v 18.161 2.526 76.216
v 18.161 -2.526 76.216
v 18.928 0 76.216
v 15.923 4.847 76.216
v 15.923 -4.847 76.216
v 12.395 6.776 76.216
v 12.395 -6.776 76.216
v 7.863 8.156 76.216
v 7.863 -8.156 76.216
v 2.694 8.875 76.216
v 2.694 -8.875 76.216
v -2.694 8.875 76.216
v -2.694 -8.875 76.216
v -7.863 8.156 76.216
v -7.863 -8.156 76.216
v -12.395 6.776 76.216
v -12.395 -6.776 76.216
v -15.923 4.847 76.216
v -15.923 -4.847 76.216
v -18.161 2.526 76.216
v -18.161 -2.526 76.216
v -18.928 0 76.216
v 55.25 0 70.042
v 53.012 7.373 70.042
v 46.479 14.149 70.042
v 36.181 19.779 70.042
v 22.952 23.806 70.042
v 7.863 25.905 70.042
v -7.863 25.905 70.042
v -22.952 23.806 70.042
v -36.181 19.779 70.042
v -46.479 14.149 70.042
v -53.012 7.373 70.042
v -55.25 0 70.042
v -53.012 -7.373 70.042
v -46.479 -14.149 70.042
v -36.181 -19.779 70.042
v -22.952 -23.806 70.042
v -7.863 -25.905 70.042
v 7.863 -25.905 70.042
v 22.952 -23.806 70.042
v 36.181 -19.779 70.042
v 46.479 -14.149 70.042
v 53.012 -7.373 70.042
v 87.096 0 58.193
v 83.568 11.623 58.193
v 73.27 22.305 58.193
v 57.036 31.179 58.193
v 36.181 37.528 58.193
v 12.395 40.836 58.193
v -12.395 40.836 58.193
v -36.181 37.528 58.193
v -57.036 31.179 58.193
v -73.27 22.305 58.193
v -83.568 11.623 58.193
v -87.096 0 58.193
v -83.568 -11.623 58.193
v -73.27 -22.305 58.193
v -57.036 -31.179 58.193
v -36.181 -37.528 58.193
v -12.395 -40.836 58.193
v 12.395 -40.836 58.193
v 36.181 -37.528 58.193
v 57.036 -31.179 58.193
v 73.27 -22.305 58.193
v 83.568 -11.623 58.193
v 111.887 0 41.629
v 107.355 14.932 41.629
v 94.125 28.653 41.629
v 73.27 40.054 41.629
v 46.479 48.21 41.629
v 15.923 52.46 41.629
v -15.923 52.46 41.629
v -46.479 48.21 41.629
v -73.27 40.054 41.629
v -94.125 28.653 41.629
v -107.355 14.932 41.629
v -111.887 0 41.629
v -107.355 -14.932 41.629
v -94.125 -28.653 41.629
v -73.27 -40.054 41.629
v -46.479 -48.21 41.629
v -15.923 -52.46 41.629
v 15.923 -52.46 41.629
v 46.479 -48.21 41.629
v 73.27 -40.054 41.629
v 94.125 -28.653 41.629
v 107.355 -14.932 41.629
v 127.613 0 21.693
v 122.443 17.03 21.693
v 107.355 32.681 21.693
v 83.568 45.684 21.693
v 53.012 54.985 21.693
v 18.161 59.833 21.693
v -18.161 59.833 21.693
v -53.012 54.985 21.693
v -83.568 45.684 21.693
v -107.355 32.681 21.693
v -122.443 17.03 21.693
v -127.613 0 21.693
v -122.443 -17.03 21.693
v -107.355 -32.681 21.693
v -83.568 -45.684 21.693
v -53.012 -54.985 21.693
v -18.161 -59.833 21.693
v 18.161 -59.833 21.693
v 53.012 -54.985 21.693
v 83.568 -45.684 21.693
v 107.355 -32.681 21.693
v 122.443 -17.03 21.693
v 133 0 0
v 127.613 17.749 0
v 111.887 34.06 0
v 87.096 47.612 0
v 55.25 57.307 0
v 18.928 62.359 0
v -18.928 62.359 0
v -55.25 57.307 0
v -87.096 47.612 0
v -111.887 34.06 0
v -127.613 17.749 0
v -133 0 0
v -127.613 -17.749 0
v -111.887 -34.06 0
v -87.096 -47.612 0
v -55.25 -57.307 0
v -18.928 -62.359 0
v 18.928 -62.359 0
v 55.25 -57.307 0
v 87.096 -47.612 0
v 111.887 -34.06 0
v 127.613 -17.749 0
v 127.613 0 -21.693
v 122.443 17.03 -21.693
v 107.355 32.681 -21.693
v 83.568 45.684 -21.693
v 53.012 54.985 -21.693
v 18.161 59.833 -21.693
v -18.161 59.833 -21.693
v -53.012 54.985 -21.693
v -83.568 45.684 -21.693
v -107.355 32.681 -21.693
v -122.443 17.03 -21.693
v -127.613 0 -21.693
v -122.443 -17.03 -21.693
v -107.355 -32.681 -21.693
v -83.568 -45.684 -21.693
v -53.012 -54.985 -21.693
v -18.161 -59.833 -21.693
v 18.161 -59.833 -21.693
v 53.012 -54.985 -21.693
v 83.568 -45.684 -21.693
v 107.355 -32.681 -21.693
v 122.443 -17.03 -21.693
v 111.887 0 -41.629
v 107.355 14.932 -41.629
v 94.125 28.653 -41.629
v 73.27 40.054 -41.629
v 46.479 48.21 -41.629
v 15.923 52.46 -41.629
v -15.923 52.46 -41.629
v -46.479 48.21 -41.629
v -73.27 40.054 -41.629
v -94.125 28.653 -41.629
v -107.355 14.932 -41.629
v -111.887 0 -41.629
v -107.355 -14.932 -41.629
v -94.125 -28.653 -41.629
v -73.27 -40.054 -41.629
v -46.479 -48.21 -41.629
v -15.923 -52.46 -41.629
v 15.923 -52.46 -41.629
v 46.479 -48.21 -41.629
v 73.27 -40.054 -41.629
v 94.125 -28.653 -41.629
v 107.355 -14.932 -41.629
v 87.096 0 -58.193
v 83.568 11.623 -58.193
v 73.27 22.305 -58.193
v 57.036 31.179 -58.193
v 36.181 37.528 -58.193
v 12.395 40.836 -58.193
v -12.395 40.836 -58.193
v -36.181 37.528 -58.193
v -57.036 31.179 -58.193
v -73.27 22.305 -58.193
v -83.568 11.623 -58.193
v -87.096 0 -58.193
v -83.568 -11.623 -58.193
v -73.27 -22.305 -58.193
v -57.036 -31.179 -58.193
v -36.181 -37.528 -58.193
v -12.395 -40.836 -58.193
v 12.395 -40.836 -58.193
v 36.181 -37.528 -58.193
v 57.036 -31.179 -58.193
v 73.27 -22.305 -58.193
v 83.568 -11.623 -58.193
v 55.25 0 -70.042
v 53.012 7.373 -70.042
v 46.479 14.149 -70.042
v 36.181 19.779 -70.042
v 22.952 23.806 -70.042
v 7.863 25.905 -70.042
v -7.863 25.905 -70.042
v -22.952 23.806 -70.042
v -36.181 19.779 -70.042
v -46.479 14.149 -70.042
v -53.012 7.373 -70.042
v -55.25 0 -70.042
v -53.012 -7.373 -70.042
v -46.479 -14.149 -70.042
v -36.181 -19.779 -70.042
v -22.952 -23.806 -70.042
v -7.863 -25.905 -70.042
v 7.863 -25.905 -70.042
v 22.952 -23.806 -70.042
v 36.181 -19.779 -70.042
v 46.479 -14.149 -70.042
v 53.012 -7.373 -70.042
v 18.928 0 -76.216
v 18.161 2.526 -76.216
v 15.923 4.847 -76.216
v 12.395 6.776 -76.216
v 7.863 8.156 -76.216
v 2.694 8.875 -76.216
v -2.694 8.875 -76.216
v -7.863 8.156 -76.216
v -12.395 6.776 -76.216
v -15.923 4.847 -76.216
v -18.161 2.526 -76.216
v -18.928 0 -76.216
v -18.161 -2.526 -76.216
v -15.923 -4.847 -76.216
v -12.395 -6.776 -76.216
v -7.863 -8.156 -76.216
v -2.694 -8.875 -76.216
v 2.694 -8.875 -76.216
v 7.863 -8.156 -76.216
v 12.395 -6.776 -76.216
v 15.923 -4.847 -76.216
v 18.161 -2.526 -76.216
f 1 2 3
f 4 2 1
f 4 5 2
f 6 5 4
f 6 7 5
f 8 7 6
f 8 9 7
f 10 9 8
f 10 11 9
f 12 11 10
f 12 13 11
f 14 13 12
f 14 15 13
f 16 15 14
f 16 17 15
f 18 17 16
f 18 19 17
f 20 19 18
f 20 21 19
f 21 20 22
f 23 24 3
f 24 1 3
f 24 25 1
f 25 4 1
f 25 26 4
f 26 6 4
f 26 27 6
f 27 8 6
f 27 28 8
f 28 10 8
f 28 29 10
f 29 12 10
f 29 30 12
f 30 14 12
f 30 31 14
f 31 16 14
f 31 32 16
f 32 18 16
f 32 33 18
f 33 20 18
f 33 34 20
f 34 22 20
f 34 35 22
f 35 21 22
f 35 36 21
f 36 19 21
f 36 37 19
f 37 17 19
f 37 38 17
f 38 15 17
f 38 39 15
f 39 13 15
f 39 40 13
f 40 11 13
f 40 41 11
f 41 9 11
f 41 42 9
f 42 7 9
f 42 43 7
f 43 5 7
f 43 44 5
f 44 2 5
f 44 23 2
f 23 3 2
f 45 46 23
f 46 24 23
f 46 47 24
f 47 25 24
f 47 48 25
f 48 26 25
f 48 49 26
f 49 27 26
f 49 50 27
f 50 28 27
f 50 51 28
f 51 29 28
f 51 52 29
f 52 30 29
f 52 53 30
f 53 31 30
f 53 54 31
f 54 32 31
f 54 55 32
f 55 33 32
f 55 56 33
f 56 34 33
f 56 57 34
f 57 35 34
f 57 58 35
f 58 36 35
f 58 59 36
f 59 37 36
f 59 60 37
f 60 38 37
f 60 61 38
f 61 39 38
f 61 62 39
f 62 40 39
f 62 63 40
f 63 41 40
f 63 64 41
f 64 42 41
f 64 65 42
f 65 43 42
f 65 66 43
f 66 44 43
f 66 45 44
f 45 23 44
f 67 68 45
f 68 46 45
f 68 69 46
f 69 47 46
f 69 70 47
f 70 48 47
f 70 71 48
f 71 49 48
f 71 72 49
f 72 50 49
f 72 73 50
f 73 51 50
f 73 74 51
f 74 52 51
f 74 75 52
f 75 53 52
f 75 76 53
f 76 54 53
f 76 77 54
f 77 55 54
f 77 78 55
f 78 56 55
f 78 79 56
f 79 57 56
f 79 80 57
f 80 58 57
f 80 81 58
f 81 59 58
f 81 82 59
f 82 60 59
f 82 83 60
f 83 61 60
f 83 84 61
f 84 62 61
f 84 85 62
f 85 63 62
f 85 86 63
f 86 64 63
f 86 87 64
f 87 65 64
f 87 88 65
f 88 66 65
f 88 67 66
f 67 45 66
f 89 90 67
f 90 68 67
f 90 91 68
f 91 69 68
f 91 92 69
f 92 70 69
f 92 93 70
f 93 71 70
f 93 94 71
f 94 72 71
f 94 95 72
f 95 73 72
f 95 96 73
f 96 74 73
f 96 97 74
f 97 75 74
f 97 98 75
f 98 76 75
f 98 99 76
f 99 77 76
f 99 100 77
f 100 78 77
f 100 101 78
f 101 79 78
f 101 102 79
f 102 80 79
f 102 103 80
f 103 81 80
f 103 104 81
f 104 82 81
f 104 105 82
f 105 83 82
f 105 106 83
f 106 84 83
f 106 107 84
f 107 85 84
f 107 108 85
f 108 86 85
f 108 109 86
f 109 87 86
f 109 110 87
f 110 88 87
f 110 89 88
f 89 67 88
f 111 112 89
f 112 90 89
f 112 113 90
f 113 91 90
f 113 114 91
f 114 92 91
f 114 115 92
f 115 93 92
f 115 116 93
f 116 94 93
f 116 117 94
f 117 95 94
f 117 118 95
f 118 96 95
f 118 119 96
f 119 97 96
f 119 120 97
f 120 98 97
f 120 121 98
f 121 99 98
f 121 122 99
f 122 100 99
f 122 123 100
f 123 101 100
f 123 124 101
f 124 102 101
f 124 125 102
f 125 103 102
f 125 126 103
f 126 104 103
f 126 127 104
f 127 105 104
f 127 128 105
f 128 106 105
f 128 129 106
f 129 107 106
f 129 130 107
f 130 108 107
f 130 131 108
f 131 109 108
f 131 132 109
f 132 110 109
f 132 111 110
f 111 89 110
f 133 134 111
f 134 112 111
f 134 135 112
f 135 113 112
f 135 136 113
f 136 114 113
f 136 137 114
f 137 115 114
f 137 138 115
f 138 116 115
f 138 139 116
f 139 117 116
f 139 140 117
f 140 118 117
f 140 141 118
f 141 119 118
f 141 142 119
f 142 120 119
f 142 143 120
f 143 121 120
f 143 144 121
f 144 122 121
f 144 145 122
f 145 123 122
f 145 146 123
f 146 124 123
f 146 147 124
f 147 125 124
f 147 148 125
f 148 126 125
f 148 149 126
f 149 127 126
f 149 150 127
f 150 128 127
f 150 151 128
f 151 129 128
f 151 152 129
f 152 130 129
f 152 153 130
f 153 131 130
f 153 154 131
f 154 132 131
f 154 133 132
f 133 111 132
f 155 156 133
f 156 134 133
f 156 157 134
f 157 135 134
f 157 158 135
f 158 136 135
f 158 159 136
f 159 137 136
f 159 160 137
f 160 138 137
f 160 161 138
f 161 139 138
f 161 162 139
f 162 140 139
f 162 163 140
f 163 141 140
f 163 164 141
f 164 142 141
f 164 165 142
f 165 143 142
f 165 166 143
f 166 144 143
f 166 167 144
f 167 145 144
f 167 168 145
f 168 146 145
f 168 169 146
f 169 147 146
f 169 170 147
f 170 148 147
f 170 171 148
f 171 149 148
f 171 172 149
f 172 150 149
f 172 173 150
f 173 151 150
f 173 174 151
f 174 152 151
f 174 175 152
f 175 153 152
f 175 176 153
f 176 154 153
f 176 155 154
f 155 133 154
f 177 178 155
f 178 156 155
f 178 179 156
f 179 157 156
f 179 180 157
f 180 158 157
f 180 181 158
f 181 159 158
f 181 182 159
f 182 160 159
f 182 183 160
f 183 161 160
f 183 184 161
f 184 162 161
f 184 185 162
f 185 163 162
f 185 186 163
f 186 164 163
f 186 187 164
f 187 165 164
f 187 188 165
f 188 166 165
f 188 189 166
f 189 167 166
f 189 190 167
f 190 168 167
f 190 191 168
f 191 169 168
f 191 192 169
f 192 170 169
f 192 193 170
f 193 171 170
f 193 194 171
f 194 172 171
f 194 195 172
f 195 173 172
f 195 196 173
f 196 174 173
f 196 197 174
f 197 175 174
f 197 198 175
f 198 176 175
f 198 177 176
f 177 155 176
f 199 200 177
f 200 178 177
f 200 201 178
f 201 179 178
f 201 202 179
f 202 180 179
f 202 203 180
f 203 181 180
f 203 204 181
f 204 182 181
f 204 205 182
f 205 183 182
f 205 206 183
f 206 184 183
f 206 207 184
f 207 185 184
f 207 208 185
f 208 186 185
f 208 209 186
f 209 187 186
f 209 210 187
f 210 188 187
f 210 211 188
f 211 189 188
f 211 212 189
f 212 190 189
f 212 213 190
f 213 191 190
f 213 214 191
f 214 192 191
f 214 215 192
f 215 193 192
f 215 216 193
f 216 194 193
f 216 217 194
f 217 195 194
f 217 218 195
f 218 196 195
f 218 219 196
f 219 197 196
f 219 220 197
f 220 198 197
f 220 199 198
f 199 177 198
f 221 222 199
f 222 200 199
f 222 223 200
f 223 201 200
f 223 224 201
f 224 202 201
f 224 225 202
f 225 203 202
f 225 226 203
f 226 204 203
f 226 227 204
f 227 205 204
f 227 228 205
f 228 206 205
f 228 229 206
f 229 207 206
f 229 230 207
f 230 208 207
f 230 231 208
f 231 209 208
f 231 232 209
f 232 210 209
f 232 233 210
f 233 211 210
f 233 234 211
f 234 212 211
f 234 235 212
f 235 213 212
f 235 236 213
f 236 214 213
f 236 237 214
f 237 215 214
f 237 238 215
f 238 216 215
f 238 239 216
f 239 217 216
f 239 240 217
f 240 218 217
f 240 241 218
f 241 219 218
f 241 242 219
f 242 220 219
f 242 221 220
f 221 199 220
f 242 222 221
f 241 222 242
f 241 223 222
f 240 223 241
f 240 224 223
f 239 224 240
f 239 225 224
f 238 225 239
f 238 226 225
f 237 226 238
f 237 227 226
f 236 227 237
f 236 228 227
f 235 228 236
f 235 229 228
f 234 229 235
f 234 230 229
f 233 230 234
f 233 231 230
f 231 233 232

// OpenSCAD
// Generated by SolidPython 1.0.1 on 2020-07-29 00:46:54


scale(v = [19, 9, 11]) {
	sphere(r = 7);
}
/***********************************************
*********      SolidPython code:      **********
************************************************
 
# import packages: SolidPython
from solid import *
from solid.utils import *
from itertools import chain, combinations, permutations


class Resize:

    def __init__(self, scad_file):
        self.scad_file = scad_file
        #self.scad_file = import_scad(scad_file)
        # cone/cylinder param:
        self.r1 = 0
        self.r2 = 0
        self.h = 0
        # rectangular prism param:
        self.w = 0
        self.l = 0
        # ellipse param:
        self.r = 0

    # import OpenScad code (file name corresponds to shape)


    # classify shape + parameters
    def assign(self, param1, param2, param3):
        if self.scad_file == 'cone.scad':
            self.r1 = param1
            self.r2 = param2
            self.h = param3
        elif self.scad_file == 'cylinder.scad':
            self.r1 = param1
            self.r2 = param2
            self.h = param3
        elif self.scad_file == 'rectangularPrism.scad':
            self.h = param1
            self.l = param2
            self.w = param3
        else:
            self.r = param1
            self.h = param2

    # resize parameters
    def iterate(self):
        x = range(3, 20, 2)
        i = 1
        if self.scad_file == 'cone.scad':
            tempList = list(permutations(x, 2))
            for temp in tempList:
                param1 = temp[0]
                param2 = temp[1]
                filepath = 'produced_scad_files/' + 'cone' + str(param1) + '_' + str(param2) + '_' + '.scad'
                scad_render_to_file(cylinder(h=param1, r1=param2, r2=0), filepath)

        elif self.scad_file == 'cylinder.scad':
            tempList = list(permutations(x, 3))
            for temp in tempList:
                param1 = temp[0]
                param2 = temp[1]
                filepath = 'produced_scad_files/' + 'cylinder' + str(param1) + '_' + str(param2) + '_' + '.scad'
                scad_render_to_file(cylinder(h=param1, r1=param2, r2=param2), filepath)

        elif self.scad_file == 'rectangularPrism.scad':
            tempList = list(permutations(x, 3))
            for temp in tempList:
                param1 = temp[0]
                param2 = temp[1]
                param3 = temp[2]
                filepath = 'produced_scad_files/' + 'rectangularPrism' + str(param1) + '_' + str(param2) + '_' + str(
                    param3) + '.scad'
                scad_render_to_file(cube(size=(param1, param2, param3)), filepath)

        elif self.scad_file == 'ellipse.scad':
            tempList = list(permutations(x, 4))
            for temp in tempList:
                param1 = temp[0]
                param2 = temp[1]
                param3 = temp[2]
                param4 = temp[3]
                filepath = 'produced_scad_files/' + 'ellipse' + str(param1) + '_' + str(param2) + '_' + str(param3) + '_' + str(param4) + '.scad'
                scad_render_to_file(scale([param1, param2, param3])(sphere(r=param4)), filepath)

    def render_to_scadfile(self):
        scad_render_to_file(scad, 'example.scad') 
 
************************************************/
